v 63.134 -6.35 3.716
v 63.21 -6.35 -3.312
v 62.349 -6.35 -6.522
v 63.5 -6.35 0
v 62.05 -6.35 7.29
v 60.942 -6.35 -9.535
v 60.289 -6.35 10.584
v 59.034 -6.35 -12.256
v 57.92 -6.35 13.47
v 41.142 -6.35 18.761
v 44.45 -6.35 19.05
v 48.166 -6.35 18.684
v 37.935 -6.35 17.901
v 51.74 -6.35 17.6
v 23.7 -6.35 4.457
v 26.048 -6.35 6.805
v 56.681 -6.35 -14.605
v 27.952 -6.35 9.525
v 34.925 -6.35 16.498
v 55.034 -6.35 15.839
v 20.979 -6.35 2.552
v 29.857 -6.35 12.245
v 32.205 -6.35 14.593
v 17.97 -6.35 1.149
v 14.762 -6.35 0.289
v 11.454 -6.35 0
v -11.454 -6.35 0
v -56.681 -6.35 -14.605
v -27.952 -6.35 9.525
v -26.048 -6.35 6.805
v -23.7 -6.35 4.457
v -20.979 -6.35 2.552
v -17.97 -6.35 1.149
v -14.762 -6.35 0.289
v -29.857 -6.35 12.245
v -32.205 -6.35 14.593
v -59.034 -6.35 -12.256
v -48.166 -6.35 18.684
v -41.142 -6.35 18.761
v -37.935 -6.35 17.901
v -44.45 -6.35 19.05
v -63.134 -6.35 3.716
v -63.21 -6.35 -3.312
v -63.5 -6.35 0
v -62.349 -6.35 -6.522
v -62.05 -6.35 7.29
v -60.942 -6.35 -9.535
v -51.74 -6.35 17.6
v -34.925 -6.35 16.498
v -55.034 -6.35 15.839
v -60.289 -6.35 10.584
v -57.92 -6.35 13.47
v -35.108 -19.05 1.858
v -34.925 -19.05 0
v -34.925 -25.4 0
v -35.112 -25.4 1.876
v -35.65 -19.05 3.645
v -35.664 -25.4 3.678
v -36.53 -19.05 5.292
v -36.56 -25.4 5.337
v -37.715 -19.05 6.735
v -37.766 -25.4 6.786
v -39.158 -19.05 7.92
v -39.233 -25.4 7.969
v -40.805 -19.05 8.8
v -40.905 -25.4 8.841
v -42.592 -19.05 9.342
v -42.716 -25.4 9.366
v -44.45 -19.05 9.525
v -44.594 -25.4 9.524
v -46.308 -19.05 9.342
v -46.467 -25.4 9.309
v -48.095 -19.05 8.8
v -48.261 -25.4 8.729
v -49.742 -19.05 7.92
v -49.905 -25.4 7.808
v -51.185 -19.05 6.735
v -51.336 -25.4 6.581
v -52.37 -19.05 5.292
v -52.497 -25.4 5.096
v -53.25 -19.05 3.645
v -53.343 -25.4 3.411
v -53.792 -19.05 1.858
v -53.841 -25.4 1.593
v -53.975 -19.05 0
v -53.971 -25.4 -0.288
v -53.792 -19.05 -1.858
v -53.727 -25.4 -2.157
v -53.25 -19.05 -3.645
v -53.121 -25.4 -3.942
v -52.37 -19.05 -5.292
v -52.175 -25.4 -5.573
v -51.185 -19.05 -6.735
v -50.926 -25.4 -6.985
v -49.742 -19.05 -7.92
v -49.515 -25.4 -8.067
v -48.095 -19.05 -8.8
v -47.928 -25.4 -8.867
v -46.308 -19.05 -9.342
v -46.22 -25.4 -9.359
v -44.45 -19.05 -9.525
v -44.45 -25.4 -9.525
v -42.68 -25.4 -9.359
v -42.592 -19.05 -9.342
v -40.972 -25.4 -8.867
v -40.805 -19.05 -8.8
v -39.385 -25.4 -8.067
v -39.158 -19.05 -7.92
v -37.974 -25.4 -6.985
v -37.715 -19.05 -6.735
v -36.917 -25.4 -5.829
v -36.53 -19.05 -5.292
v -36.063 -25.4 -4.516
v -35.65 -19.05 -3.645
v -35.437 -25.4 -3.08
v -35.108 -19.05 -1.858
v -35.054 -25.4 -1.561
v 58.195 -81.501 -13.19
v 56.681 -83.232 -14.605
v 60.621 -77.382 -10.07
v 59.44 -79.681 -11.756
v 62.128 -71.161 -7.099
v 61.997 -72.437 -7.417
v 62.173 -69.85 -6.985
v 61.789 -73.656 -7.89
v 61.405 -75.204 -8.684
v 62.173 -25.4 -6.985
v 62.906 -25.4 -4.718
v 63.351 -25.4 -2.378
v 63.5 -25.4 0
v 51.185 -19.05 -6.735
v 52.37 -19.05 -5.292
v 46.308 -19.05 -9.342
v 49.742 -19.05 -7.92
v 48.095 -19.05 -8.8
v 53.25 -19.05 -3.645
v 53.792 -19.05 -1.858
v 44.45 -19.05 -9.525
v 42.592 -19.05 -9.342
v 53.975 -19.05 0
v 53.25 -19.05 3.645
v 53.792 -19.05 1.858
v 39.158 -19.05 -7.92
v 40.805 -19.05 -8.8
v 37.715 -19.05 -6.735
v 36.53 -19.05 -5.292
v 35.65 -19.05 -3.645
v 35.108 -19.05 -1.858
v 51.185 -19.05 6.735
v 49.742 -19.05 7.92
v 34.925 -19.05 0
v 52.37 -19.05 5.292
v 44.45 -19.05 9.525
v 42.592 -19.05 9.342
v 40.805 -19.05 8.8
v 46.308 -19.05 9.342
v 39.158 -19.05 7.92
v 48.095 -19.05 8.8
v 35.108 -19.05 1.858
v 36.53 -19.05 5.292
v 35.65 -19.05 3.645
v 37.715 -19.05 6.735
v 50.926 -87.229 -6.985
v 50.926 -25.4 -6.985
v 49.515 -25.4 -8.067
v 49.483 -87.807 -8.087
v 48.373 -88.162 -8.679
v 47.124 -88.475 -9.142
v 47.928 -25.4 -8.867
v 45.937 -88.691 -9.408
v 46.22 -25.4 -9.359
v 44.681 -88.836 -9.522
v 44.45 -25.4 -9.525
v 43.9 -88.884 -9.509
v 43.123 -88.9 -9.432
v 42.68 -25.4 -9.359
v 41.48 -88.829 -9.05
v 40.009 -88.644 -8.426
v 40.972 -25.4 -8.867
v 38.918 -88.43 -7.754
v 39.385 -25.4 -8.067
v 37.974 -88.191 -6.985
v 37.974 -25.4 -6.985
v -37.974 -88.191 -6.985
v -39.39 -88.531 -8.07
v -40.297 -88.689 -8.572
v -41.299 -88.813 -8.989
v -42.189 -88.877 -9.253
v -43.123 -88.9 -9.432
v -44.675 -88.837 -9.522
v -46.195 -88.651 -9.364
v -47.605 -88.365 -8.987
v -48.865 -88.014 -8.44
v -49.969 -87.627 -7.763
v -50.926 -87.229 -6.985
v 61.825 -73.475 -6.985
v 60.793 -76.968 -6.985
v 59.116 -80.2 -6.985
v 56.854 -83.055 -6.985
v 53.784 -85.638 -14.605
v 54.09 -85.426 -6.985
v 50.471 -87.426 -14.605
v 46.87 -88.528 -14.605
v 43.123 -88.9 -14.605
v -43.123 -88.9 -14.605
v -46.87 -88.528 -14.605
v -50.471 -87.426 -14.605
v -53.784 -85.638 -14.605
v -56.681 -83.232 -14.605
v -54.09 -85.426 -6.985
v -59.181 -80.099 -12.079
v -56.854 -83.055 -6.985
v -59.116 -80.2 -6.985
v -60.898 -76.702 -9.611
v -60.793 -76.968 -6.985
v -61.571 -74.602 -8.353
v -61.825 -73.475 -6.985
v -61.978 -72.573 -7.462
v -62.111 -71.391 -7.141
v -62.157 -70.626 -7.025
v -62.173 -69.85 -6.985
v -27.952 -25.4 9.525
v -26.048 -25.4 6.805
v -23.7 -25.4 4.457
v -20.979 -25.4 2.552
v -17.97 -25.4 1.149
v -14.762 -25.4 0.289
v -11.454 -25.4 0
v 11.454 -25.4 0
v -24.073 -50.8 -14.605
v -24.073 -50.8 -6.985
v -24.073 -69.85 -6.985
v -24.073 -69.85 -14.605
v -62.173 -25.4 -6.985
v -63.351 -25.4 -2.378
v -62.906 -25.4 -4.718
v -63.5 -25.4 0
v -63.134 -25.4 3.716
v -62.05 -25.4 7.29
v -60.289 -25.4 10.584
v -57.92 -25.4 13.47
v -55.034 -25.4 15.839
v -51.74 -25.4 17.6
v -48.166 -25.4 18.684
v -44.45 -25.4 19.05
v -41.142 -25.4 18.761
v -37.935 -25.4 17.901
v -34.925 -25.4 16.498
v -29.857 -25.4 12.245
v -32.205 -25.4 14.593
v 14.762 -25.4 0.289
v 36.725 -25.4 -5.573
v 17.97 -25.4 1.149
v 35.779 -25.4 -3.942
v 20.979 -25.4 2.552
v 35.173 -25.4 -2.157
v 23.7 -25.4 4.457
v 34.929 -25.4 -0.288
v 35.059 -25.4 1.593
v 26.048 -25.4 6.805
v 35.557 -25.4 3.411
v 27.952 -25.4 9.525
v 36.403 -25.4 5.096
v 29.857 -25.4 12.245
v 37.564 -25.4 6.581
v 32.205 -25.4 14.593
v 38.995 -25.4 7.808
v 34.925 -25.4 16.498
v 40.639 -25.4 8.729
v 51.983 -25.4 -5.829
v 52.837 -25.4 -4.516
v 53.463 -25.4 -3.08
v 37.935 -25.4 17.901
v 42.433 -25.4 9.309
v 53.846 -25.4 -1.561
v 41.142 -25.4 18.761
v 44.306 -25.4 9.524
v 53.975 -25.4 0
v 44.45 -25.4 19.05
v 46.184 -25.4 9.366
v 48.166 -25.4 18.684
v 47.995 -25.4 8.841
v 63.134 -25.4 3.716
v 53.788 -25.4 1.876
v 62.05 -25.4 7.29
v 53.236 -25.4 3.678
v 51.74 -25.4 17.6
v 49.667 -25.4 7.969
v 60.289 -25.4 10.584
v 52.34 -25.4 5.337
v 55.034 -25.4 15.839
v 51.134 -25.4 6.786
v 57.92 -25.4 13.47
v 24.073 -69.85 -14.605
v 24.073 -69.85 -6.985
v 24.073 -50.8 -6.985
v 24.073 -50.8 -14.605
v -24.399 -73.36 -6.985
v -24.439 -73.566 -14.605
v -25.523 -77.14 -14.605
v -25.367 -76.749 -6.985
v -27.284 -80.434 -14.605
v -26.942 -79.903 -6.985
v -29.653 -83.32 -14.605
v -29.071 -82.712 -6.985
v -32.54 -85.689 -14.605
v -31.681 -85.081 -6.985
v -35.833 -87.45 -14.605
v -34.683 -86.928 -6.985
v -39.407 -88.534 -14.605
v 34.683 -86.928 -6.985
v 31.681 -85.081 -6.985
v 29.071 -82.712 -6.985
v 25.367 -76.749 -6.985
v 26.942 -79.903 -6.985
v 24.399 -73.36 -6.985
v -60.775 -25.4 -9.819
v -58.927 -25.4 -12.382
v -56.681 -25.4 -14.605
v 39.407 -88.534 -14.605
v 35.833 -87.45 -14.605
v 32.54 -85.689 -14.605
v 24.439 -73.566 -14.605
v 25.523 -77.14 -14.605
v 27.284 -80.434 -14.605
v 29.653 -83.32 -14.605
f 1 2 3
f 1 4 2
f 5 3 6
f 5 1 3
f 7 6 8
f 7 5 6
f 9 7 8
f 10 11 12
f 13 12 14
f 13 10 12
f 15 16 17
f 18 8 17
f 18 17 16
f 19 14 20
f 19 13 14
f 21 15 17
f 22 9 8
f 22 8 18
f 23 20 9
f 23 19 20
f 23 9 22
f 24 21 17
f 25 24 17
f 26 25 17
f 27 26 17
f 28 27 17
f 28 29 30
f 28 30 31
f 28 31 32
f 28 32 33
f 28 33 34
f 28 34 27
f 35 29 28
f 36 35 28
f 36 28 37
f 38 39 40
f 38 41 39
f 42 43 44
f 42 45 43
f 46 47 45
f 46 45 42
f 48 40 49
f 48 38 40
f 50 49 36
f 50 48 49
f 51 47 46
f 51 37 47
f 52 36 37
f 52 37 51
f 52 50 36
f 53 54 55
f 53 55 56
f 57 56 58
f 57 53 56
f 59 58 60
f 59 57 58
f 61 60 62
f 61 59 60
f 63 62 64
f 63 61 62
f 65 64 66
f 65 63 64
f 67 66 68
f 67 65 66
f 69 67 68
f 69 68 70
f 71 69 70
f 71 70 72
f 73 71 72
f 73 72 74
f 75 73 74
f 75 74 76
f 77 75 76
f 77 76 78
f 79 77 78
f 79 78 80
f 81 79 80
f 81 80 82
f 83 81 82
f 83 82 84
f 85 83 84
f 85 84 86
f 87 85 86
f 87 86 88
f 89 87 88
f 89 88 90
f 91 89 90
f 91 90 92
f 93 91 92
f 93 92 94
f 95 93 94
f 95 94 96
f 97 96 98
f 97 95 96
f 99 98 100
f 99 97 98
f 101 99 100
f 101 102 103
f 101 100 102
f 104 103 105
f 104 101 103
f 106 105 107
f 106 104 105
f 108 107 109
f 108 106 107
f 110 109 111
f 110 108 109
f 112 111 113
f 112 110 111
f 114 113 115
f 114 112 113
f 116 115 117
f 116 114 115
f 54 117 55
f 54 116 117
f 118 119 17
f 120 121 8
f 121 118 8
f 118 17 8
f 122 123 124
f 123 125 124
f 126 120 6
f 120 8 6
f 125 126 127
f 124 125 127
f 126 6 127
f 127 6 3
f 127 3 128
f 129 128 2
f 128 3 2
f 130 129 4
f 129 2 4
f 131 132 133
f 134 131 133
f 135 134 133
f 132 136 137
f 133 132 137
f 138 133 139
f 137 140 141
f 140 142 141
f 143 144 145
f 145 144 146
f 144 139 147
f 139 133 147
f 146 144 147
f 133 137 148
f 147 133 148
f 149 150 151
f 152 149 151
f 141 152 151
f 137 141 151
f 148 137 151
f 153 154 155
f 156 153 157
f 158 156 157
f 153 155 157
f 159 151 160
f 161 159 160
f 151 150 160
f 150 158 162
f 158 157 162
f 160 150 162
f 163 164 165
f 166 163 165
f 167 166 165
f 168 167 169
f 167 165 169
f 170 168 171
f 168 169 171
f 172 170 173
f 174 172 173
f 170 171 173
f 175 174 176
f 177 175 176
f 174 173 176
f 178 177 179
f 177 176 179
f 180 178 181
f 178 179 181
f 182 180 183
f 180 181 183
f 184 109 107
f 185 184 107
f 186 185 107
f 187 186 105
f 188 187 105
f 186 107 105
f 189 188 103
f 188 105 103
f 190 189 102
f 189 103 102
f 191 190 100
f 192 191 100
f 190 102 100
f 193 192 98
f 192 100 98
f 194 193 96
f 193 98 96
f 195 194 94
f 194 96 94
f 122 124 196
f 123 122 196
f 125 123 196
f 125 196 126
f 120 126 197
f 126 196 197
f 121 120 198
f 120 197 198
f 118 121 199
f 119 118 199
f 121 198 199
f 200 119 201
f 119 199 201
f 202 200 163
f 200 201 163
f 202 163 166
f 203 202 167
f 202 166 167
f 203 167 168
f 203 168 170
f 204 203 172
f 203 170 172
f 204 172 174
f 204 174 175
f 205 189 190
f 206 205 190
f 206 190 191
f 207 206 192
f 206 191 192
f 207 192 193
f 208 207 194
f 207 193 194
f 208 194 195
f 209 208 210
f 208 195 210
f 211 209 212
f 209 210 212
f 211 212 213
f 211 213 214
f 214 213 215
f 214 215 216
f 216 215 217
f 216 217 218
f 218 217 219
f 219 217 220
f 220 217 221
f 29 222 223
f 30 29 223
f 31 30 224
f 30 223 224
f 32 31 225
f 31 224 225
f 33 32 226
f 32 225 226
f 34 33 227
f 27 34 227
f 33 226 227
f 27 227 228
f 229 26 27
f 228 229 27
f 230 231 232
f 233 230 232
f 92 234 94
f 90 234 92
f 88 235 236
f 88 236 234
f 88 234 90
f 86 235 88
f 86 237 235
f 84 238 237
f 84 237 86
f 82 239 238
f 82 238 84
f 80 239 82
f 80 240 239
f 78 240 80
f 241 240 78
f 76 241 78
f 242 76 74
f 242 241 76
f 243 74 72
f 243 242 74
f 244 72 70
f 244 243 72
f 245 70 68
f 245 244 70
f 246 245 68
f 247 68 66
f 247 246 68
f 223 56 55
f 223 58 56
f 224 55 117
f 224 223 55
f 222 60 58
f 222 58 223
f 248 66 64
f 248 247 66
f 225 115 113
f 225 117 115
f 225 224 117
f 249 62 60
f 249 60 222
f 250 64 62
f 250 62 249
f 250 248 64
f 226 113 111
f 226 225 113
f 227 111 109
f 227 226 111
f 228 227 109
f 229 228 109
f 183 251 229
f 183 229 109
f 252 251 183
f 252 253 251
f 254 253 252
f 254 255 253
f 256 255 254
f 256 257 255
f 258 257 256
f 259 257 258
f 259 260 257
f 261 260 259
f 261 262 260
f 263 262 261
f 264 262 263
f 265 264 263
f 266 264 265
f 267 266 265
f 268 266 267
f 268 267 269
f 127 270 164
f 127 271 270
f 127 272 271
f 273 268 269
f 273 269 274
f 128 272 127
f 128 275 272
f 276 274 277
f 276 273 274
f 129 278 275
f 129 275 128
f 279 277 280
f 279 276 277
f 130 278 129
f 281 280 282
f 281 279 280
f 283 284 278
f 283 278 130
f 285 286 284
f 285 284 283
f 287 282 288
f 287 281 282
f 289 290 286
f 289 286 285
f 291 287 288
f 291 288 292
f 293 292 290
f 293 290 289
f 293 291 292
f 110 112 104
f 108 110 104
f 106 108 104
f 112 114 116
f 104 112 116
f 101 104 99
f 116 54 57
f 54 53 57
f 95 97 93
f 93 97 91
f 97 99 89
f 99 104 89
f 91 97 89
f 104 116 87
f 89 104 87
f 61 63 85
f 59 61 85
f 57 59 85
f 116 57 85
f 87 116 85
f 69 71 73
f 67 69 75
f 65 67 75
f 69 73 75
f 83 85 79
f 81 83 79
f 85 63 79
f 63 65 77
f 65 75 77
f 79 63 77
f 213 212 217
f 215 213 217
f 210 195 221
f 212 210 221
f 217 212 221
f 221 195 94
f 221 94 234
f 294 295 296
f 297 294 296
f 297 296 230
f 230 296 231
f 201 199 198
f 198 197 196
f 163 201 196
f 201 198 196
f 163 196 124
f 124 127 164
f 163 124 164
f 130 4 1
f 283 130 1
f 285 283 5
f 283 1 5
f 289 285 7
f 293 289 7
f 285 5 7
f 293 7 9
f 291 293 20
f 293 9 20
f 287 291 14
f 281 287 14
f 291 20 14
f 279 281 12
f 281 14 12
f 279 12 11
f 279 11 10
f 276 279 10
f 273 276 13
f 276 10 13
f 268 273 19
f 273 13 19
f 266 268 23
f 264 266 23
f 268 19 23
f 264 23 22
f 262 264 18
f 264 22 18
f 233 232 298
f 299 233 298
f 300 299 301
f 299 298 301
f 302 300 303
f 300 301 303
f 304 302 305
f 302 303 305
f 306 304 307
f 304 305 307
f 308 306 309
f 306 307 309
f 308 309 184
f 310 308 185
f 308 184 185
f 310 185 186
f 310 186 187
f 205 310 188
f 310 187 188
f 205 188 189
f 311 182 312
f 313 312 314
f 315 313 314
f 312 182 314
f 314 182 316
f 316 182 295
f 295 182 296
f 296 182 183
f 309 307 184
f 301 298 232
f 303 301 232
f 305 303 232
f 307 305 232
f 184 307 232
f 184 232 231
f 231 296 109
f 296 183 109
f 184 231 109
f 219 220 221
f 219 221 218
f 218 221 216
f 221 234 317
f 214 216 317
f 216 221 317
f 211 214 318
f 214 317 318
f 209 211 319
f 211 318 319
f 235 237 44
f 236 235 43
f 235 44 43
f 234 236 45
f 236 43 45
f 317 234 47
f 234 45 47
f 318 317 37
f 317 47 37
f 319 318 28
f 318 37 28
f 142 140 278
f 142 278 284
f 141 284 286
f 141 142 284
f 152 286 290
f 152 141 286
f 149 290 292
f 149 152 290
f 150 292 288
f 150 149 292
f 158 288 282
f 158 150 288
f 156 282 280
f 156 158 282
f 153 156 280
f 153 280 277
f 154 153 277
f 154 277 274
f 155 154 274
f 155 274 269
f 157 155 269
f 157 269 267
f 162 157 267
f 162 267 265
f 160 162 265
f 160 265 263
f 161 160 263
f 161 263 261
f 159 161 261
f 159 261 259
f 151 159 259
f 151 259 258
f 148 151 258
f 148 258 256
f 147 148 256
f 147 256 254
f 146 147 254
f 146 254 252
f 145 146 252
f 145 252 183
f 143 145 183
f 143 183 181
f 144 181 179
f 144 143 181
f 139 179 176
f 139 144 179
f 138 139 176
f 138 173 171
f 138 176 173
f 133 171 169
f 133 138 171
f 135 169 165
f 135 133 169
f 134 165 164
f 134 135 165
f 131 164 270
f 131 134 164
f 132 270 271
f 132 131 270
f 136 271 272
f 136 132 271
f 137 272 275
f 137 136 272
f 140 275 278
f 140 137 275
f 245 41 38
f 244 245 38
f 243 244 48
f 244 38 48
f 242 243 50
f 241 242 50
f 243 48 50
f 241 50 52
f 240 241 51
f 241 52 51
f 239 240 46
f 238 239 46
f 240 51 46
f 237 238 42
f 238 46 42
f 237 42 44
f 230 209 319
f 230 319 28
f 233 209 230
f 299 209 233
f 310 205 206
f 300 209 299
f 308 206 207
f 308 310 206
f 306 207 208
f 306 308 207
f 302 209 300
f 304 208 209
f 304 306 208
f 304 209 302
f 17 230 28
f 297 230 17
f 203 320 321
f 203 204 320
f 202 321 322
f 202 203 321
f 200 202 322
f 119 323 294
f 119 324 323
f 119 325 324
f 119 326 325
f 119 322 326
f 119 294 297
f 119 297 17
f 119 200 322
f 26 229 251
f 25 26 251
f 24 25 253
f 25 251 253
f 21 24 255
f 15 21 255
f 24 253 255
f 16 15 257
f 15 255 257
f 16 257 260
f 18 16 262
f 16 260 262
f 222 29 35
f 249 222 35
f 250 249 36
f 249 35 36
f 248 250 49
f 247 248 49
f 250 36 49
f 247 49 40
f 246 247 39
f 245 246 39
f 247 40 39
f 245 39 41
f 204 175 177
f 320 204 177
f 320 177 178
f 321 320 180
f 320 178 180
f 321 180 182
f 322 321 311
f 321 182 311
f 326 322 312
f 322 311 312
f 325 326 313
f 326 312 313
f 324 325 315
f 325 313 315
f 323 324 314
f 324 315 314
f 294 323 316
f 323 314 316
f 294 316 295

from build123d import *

# Parameters (mm, degrees)
F0_R      = 9.525
F1_DEPTH  = 25.4
F3_DEPTH  = 63.5
F4_DEPTH  = 46.228
F5_R      = 19.05
F6_R      = 9.525
F7_DEPTH  = 19.05
F8_DEPTH  = 6.35
F10_DEPTH = 25.4
F11_W     = 17.3040702939
F11_H     = 4.6345468581
F12_DEPTH = 12.7
F13_W     = 23.2714904292
F13_H     = 5.4139880085
F14_DEPTH = 12.7
F16_DEPTH = 25.4
F17_DEPTH = 25.4


with BuildPart() as f1:
    # F0 (on Front) → F1 (new body)
    with BuildSketch(Plane.XZ):
        with BuildLine():
            Line((-44.45, -19.05), (44.45, -19.05))
            ThreePointArc((44.45, -19.05), (30.9796158184, -13.4703841816), (25.4, 0))
            Line((25.4, 0), (-25.4, 0))
            ThreePointArc((-25.4, 0), (-30.9796158184, -13.4703841816), (-44.45, -19.05))
        make_face()
        with BuildLine():
            ThreePointArc((-63.5, 0), (-57.9203841816, -13.4703841816), (-44.45, -19.05))
            ThreePointArc((-44.45, -19.05), (-30.9796158184, -13.4703841816), (-25.4, 0))
            ThreePointArc((-25.4, 0), (-30.9796158184, 13.4703841816), (-44.45, 19.05))
            ThreePointArc((-44.45, 19.05), (-57.9203841816, 13.4703841816), (-63.5, 0))
        make_face()
        with Locations((-44.45, 0)):
            Circle(F0_R, mode=Mode.SUBTRACT)
        with BuildLine():
            ThreePointArc((25.4, 0), (30.9796158184, -13.4703841816), (44.45, -19.05))
            ThreePointArc((44.45, -19.05), (57.9203841816, -13.4703841816), (63.5, 0))
            ThreePointArc((63.5, 0), (57.9203841816, 13.4703841816), (44.45, 19.05))
            ThreePointArc((44.45, 19.05), (30.9796158184, 13.4703841816), (25.4, 0))
        make_face()
        with Locations((44.45, 0)):
            Circle(F0_R, mode=Mode.SUBTRACT)
    extrude(amount=F1_DEPTH)

    # F2 (on face) → F3 (join)
    with BuildSketch(Plane.XZ.offset(25.4)):
        with BuildLine():
            Line((-50.9257547823, -6.985), (-62.1732128859, -6.985))
            ThreePointArc((-62.1732128859, -6.985), (-59.9041022043, -11.1388161426), (-56.6809637805, -14.605))
            Line((-56.6809637805, -14.605), (56.6809637805, -14.605))
            ThreePointArc((56.6809637805, -14.605), (59.9041022043, -11.1388161426), (62.1732128859, -6.985))
            Line((62.1732128859, -6.985), (50.9257547823, -6.985))
            ThreePointArc((50.9257547823, -6.985), (44.45, -9.525), (37.9742452177, -6.985))
            Line((37.9742452177, -6.985), (-37.9742452177, -6.985))
            ThreePointArc((-37.9742452177, -6.985), (-44.45, -9.525), (-50.9257547823, -6.985))
        make_face()
    extrude(amount=F3_DEPTH)

    # F4 (cut): a face of the model
    f4_faces = [f1.faces().sort_by_distance(p)[0] for p in [
        (0, -25.4, -16.7601163622),
    ]]
    extrude(f4_faces, amount=-F4_DEPTH, mode=Mode.SUBTRACT)

    # F5
    f5_edges = [f1.edges().sort_by_distance(p)[0] for p in [
        (-25.4, -12.7, 0),
        (25.4, -12.7, 0),
    ]]
    fillet(f5_edges, radius=F5_R)

    # F6 (on face) → F7 (join)
    with BuildSketch(Plane(origin=(0, 0, 0), x_dir=(-1, 0, 0), z_dir=(0, 1, 0))):
        with Locations((-44.45, 0)):
            Circle(F6_R)
        with Locations((44.45, 0)):
            Circle(F6_R)
    extrude(amount=-F7_DEPTH)

    # F8 (cut): a face of the model
    f8_faces = [f1.faces().sort_by_distance(p)[0] for p in [
        (0, 0, -1.1785637601),
    ]]
    extrude(f8_faces, amount=-F8_DEPTH, mode=Mode.SUBTRACT)

    # F9 (on face) → F10 (cut)
    with BuildSketch(Plane.XY.offset(-6.985)):
        Polygon((24.0732128859, -69.85), (24.0732128859, -50.8), (-24.0732128859, -50.8), (-24.0732128859, -69.85), (-24.0732128859, -88.9), (24.0732128859, -88.9), align=None)
    extrude(amount=-F10_DEPTH, mode=Mode.SUBTRACT)

    # F11 (on face) → F12 (join)
    with BuildSketch(Plane.XZ.offset(88.9)):
        with Locations((-43.290130794, -9.3022734291)):
            Rectangle(F11_W, F11_H)
    extrude(amount=-F12_DEPTH)

    # F13 (on face) → F14 (join)
    with BuildSketch(Plane.XZ.offset(88.9)):
        with Locations((42.6594742664, -9.6919940042)):
            Rectangle(F13_W, F13_H)
    extrude(amount=-F14_DEPTH)

    # F15 (on face) → F16 (cut)
    with BuildSketch(Plane.XY.offset(-6.985)):
        with BuildLine():
            Line((62.1732128859, -88.9), (62.1732128859, -69.85))
            ThreePointArc((62.1732128859, -69.85), (56.5935970675, -83.3203841816), (43.1232128859, -88.9))
            Line((43.1232128859, -88.9), (50.9257547823, -88.9))
            Line((50.9257547823, -88.9), (54.295219481, -88.9))
            Line((54.295219481, -88.9), (62.1732128859, -88.9))
        make_face()
        with BuildLine():
            Line((37.9742452177, -88.9), (43.1232128859, -88.9))
            ThreePointArc((43.1232128859, -88.9), (29.6528287043, -83.3203841816), (24.0732128859, -69.85))
            Line((24.0732128859, -69.85), (24.0732128859, -88.9))
            Line((24.0732128859, -88.9), (31.0237290518, -88.9))
            Line((31.0237290518, -88.9), (37.9742452177, -88.9))
        make_face()
        with BuildLine():
            Line((-24.0732128859, -88.9), (-24.0732128859, -69.85))
            ThreePointArc((-24.0732128859, -69.85), (-29.6528287043, -83.3203841816), (-43.1232128859, -88.9))
            Line((-43.1232128859, -88.9), (-37.9742452177, -88.9))
            Line((-37.9742452177, -88.9), (-34.6380956471, -88.9))
            Line((-34.6380956471, -88.9), (-24.0732128859, -88.9))
        make_face()
        with BuildLine():
            Line((-50.9257547823, -88.9), (-43.1232128859, -88.9))
            ThreePointArc((-43.1232128859, -88.9), (-56.5935970675, -83.3203841816), (-62.1732128859, -69.85))
            Line((-62.1732128859, -69.85), (-62.1732128859, -88.9))
            Line((-62.1732128859, -88.9), (-51.942165941, -88.9))
            Line((-51.942165941, -88.9), (-50.9257547823, -88.9))
        make_face()
    extrude(amount=-F16_DEPTH, mode=Mode.SUBTRACT)

    # F17 (cut): faces of the model
    f17_faces = [f1.faces().sort_by_distance(p)[0] for p in [
        (44.45, -76.2, -8.0135872996),
        (-44.45, -76.2, -8.0135872996),
    ]]
    extrude(f17_faces, amount=-F17_DEPTH, mode=Mode.SUBTRACT)


solid = f1.part
